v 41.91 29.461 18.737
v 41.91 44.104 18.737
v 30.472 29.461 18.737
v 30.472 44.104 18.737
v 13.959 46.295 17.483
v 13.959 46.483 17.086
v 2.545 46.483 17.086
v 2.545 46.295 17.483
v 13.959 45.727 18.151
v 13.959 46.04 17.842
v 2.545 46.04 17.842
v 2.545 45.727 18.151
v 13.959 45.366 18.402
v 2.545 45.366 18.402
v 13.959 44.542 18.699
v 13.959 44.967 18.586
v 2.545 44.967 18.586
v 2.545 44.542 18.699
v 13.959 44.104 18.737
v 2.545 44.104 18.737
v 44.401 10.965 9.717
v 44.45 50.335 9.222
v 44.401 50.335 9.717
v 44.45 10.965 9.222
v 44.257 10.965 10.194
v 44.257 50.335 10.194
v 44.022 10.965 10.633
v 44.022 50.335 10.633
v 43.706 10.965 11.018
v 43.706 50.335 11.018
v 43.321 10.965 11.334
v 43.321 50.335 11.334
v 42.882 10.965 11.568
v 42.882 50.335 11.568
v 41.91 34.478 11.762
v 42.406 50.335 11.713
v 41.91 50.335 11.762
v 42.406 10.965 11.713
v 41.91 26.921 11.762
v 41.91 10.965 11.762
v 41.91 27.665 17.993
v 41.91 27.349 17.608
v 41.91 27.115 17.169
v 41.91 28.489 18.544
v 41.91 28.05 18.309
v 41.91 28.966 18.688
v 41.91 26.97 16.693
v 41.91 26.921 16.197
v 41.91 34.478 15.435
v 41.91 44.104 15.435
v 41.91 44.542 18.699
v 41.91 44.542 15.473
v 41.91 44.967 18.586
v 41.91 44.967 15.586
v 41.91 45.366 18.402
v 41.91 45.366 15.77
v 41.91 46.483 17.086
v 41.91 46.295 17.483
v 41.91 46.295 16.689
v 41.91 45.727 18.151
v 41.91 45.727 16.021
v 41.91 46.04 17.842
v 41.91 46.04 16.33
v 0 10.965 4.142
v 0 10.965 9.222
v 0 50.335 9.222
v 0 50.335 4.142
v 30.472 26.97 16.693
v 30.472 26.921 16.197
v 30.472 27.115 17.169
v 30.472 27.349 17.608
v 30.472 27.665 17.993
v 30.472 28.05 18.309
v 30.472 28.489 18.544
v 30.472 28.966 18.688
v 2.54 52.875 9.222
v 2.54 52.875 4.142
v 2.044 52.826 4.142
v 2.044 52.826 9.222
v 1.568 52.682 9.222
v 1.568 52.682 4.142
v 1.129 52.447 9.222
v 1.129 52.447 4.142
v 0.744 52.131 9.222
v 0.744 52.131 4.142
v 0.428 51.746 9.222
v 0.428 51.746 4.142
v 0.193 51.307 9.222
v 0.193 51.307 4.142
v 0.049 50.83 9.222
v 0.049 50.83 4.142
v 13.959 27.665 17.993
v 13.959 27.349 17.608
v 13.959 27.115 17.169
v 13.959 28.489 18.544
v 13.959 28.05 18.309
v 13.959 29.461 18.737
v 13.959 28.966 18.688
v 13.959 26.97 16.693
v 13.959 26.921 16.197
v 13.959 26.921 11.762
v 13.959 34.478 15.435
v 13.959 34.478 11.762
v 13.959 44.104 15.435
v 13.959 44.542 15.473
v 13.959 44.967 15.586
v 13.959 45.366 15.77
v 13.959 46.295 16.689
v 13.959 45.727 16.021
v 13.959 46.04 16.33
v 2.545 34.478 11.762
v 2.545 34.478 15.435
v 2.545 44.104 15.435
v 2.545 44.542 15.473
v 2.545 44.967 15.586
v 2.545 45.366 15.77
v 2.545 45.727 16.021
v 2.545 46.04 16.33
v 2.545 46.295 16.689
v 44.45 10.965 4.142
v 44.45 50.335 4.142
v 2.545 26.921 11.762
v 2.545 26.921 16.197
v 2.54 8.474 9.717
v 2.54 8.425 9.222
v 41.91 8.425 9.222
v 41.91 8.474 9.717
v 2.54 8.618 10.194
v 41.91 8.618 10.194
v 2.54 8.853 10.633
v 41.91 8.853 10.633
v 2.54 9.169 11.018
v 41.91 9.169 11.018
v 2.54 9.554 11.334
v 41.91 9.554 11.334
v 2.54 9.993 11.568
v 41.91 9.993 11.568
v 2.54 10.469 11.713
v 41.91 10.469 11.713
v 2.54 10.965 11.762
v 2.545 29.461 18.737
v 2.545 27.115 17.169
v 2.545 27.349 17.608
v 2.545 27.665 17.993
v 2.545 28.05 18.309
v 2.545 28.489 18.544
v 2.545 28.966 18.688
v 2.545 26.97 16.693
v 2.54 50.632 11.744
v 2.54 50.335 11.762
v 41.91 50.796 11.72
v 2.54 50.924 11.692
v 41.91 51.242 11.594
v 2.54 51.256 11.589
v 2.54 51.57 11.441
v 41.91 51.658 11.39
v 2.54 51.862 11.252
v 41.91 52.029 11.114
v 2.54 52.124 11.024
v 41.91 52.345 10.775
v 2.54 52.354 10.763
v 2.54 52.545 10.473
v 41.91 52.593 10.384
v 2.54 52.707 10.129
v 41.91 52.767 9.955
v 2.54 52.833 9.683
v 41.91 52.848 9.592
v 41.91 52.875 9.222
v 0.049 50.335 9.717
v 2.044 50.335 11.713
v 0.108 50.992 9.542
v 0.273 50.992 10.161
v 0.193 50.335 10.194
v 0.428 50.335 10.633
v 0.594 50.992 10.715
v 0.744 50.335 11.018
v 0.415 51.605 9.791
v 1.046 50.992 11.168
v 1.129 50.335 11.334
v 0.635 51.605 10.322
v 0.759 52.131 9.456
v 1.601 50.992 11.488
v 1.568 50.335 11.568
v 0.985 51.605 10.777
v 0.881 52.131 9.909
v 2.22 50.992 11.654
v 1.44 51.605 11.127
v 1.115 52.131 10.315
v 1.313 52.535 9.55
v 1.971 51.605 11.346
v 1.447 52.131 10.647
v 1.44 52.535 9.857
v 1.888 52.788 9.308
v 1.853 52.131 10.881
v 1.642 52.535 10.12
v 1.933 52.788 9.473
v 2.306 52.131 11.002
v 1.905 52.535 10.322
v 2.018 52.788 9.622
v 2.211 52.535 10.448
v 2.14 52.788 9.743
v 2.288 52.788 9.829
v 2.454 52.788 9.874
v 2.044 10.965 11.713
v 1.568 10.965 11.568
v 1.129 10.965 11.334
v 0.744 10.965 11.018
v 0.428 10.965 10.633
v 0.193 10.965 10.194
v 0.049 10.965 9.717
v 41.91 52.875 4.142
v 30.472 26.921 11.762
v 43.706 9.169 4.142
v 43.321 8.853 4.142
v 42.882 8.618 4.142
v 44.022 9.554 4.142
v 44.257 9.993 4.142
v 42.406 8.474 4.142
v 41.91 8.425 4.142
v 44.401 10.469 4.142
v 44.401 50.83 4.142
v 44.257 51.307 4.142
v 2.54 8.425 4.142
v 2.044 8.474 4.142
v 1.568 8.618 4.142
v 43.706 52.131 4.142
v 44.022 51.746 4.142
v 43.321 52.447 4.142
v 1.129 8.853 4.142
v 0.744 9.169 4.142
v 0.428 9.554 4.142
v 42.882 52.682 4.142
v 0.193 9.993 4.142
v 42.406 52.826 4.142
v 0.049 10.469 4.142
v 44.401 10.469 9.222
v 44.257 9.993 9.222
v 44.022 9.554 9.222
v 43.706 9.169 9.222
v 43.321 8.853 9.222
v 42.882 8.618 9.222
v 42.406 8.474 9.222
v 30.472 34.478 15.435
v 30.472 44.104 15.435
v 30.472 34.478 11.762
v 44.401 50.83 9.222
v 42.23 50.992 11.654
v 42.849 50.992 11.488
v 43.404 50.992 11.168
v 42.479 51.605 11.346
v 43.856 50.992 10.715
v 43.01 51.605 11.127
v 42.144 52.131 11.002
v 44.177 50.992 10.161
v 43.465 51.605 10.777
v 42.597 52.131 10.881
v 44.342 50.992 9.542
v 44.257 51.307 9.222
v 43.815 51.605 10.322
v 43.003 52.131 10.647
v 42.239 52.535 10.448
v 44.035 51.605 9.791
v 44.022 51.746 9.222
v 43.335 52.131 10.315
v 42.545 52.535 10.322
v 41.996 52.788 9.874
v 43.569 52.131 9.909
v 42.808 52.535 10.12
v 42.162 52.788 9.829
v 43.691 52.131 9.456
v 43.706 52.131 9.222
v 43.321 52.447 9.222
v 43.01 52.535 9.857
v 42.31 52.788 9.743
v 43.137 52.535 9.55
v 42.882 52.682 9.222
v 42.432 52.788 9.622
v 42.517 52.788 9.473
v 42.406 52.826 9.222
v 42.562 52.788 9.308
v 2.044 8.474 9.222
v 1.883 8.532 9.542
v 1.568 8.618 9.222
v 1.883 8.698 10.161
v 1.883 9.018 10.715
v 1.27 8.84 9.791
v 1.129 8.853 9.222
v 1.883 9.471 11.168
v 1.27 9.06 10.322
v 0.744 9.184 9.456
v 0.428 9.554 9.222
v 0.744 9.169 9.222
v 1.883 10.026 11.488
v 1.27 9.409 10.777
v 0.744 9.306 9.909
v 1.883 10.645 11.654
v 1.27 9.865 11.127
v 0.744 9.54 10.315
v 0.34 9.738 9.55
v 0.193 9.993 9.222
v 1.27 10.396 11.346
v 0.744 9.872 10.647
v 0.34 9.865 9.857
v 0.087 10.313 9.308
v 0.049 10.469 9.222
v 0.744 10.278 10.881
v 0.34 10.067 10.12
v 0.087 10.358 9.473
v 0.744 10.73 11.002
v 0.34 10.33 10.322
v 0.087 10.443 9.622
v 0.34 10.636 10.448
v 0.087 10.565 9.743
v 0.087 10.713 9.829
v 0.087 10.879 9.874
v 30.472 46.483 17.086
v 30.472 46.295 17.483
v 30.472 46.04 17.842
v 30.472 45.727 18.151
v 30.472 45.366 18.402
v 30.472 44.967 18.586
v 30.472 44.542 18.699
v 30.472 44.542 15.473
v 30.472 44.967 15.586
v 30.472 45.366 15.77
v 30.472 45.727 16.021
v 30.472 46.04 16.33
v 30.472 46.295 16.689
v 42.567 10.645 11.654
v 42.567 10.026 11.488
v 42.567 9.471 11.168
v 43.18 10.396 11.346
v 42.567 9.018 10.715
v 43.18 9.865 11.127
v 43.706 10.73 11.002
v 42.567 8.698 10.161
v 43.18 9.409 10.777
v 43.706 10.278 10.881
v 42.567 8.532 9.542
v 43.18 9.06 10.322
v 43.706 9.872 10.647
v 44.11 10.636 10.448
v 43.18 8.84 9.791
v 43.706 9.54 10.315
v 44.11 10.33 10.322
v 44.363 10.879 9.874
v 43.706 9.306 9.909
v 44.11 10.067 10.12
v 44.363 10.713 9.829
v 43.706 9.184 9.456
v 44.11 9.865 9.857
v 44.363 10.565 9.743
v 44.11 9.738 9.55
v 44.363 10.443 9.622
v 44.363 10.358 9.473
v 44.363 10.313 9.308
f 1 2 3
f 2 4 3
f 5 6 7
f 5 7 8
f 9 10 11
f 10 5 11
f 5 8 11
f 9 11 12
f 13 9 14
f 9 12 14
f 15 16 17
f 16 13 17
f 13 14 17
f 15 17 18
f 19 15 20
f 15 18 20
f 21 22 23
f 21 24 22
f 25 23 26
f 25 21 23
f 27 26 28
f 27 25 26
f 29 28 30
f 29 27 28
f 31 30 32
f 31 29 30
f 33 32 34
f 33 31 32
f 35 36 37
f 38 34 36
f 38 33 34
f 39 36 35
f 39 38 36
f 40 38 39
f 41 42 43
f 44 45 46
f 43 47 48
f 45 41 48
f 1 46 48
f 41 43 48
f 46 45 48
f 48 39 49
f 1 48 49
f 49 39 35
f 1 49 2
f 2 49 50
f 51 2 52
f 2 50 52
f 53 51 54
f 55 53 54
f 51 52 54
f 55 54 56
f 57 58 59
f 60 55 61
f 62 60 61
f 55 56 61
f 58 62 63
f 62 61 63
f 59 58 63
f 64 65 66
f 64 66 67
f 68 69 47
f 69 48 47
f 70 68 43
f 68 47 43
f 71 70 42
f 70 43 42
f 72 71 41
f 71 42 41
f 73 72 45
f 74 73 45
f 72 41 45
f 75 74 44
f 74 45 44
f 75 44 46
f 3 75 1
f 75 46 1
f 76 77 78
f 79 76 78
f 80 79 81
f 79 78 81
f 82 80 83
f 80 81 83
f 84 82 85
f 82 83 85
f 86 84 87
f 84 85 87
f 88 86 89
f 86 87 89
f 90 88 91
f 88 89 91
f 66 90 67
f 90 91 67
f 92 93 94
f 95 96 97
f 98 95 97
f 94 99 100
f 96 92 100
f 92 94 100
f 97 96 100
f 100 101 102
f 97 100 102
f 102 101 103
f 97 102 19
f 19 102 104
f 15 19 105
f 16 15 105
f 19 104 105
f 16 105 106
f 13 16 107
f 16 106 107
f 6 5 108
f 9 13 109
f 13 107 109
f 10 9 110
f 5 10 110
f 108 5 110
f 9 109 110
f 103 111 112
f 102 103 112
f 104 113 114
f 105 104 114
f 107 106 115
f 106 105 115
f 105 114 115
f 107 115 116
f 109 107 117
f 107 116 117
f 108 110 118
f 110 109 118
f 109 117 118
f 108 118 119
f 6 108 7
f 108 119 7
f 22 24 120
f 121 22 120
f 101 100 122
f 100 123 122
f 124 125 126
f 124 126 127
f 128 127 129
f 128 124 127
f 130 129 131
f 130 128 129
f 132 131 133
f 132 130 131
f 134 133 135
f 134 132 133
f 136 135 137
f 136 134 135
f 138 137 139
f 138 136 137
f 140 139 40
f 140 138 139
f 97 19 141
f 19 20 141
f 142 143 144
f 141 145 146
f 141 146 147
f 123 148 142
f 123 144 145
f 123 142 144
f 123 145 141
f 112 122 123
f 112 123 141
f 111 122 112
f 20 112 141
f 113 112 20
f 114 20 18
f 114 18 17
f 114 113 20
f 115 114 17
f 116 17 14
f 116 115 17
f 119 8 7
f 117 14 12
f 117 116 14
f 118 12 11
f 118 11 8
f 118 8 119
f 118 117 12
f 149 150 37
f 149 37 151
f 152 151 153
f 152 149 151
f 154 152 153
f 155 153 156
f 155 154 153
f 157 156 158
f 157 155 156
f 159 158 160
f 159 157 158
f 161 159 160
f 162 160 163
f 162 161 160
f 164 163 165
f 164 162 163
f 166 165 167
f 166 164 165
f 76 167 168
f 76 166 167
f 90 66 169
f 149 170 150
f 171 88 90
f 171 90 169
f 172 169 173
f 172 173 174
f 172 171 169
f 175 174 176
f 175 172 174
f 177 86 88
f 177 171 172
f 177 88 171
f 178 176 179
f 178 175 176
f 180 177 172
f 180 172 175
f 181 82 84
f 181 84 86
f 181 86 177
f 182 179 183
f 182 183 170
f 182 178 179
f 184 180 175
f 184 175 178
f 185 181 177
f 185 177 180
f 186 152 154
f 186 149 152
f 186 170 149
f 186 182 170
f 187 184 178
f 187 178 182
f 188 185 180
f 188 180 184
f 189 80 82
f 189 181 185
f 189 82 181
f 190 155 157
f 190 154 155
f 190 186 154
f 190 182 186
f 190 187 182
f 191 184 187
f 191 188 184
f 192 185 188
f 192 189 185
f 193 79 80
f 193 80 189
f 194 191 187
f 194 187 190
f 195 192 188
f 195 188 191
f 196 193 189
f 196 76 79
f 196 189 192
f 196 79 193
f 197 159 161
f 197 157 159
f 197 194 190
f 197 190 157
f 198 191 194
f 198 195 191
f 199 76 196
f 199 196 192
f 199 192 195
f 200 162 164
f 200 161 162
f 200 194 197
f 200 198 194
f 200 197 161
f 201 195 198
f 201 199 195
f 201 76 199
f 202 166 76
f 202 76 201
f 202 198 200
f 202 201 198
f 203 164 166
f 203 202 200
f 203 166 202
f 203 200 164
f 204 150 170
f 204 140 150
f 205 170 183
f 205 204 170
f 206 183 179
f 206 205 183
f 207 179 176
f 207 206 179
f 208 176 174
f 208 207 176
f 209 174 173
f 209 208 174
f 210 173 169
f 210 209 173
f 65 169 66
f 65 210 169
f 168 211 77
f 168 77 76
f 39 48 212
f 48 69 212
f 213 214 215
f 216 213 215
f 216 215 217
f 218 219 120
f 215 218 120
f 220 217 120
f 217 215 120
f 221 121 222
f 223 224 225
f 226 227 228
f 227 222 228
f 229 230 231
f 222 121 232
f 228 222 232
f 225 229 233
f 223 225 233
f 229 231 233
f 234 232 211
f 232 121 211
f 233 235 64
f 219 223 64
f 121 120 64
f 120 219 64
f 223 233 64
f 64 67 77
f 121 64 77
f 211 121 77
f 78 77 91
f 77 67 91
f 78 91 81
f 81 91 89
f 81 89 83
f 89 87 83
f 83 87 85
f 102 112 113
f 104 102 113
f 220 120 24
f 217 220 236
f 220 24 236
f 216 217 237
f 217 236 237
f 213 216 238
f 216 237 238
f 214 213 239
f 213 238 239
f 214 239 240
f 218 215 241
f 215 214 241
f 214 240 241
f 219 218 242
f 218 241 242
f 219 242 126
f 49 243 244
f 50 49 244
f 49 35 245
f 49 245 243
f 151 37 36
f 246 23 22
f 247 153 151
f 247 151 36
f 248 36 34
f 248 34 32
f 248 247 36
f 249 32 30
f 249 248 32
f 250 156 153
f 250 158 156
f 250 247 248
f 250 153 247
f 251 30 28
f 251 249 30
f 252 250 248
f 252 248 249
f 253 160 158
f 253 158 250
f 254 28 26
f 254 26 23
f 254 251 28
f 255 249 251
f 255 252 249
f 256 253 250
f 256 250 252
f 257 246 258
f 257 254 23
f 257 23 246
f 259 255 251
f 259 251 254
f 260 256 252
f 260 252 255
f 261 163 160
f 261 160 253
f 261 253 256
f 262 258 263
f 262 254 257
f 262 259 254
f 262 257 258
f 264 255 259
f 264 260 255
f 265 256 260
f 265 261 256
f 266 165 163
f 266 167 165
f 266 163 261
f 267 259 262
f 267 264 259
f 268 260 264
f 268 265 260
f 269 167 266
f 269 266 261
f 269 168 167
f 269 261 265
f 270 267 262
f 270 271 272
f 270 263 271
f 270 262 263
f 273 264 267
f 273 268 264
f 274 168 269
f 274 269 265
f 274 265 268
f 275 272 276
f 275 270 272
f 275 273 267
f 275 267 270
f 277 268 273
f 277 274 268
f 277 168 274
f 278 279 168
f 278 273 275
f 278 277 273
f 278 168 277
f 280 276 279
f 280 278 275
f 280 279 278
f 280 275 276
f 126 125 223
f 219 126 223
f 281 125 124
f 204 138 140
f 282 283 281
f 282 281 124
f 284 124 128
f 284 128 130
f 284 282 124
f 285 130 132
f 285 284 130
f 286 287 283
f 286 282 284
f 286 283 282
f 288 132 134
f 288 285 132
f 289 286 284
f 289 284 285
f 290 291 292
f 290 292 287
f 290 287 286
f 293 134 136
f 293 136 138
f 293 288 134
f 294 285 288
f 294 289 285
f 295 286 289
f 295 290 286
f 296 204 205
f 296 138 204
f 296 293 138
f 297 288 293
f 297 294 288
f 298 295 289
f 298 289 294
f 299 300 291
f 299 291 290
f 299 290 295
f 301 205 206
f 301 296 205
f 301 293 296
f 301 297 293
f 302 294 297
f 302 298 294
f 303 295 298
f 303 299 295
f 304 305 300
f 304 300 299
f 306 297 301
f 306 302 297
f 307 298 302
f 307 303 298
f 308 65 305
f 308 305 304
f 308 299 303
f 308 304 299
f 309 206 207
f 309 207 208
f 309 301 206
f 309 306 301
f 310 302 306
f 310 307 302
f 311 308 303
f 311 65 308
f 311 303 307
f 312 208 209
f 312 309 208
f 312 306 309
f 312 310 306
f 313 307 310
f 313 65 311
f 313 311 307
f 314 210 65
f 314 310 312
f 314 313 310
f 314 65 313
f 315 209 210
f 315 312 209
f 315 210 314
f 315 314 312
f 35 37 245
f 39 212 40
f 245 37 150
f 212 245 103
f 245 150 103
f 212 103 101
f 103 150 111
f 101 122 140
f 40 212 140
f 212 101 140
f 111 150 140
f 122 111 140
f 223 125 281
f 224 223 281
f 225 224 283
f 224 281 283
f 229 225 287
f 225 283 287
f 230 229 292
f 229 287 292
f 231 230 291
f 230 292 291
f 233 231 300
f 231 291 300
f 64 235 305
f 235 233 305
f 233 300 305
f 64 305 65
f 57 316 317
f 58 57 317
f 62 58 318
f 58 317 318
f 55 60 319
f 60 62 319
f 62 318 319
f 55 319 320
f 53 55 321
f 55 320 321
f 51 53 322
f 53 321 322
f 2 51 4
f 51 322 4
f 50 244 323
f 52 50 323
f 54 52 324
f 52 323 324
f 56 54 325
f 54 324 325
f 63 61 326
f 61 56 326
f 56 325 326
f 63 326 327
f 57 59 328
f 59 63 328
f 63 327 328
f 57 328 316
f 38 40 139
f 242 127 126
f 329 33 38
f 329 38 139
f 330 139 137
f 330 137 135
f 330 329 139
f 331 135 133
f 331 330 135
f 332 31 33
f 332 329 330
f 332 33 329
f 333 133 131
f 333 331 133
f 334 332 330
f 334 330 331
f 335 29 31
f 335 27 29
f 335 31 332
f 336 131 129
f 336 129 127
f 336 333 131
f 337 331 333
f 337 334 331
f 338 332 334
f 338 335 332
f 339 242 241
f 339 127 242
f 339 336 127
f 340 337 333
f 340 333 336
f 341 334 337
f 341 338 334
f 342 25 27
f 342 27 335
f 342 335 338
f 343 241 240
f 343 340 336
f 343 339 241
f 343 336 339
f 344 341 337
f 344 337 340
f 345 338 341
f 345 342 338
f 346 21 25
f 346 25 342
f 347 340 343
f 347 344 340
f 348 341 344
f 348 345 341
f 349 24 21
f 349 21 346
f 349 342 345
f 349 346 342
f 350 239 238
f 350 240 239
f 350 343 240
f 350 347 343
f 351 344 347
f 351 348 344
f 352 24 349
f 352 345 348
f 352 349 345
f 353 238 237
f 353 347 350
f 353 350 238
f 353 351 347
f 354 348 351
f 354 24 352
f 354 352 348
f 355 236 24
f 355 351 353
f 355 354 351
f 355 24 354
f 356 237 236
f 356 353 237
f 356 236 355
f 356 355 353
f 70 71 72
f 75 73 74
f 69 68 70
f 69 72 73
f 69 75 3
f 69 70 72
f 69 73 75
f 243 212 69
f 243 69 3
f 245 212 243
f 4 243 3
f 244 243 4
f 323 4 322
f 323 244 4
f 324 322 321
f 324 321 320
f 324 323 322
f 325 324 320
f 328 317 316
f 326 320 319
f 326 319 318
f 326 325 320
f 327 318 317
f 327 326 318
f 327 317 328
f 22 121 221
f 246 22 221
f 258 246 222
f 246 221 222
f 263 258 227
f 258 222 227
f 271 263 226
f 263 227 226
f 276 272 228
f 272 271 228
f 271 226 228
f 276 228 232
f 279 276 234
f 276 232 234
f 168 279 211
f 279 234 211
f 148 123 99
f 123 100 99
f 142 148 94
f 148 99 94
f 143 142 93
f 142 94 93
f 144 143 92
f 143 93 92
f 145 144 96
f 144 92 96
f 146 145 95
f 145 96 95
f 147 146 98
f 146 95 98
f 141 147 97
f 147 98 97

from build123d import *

# Parameters (mm, degrees)
BOSS_EXTRUDE1_DEPTH     = 44.45
CUT_EXTRUDE1_DEPTH      = 6.35
CUT_EXTRUDE1_DEPTH_BACK = 3.81
SKETCH2_W               = 2.54
SKETCH2_H               = 19.817543538
CUT_EXTRUDE2_DEPTH      = 5.08
CUT_EXTRUDE2_DEPTH_BACK = 3.81
SKETCH4_W               = 2.544966755
SKETCH4_H               = 19.817543538
CUT_EXTRUDE3_DEPTH      = 5.08
CUT_EXTRUDE3_DEPTH_BACK = 3.81
SKETCH8_W               = 16.513276495
SKETCH8_H               = 19.817543538
FILLET3_DEPTH           = 44.45
FILLET3_START           = 7
FILLET3_2_DEPTH         = 47
FILLET4_R               = 2.54
FILLET5_R               = 2.54
FILLET6_R               = 2.54


with BuildPart() as part:
    # Sketch1 → Boss-Extrude1 (new body)
    with BuildSketch(Plane(origin=(0, 0, 0), x_dir=(0, 0, -1), z_dir=(1, 0, 0))):
        Polygon((-4.141724441, 52.87490044), (-11.761724441, 52.87490044), (-11.761724441, 34.478280211), (-15.434687804, 34.478280211), (-15.434687804, 46.643996602), (-18.737279906, 46.643996602), (-18.737279906, 26.921380181), (-11.761724441, 26.921380181), (-11.761724441, 8.42490044), (-4.141724441, 8.42490044), align=None)
    extrude(amount=BOSS_EXTRUDE1_DEPTH)

    # Sketch2 → Cut-Extrude1 (cut, two sides: drawn at the far end of the back side and taken through both)
    with BuildSketch(Plane.XY.offset(15.571724441).offset(-CUT_EXTRUDE1_DEPTH_BACK)):
        with Locations((43.18, 36.735224833)):
            Rectangle(SKETCH2_W, SKETCH2_H)
    extrude(amount=CUT_EXTRUDE1_DEPTH + CUT_EXTRUDE1_DEPTH_BACK, mode=Mode.SUBTRACT)

    # Sketch4 → Cut-Extrude2 (cut, two sides: drawn at the far end of the back side and taken through both)
    with BuildSketch(Plane.XY.offset(15.571724441).offset(-CUT_EXTRUDE2_DEPTH_BACK)):
        with Locations((1.272483378, 36.735224833)):
            Rectangle(SKETCH4_W, SKETCH4_H)
    extrude(amount=CUT_EXTRUDE2_DEPTH + CUT_EXTRUDE2_DEPTH_BACK, mode=Mode.SUBTRACT)

    # Sketch8 → Cut-Extrude3 (cut, two sides: drawn at the far end of the back side and taken through both)
    with BuildSketch(Plane.XY.offset(15.571724441).offset(-CUT_EXTRUDE3_DEPTH_BACK)):
        with Locations((22.215391178, 36.735224833)):
            Rectangle(SKETCH8_W, SKETCH8_H)
    extrude(amount=CUT_EXTRUDE3_DEPTH + CUT_EXTRUDE3_DEPTH_BACK, mode=Mode.SUBTRACT)

    # Fillet3: read off the stored shape, not the designer's step
    # Fillet3 outline → Fillet3 (cut)
    with BuildSketch(Plane.YZ):
        with BuildLine():
            ThreePointArc((8.42490044, 9.221724441), (9.168849215, 11.017775666), (10.96490044, 11.761724441))
            Line((10.96490044, 11.761724441), (8.42490044, 11.761724441))
            Line((8.42490044, 11.761724441), (8.42490044, 9.221724441))
        make_face()
        with BuildLine():
            ThreePointArc((50.33490044, 11.761724441), (52.130951664, 11.017775665), (52.87490044, 9.221724441))
            Line((52.87490044, 9.221724441), (52.87490044, 11.761724441))
            Line((52.87490044, 11.761724441), (50.33490044, 11.761724441))
        make_face()
    extrude(amount=FILLET3_DEPTH, mode=Mode.SUBTRACT)

    # Fillet3 2 outline → Fillet3 2 (cut)
    with BuildSketch(Plane(origin=(0, 0, 0), x_dir=(1, 0, 0), z_dir=(0, 1, 0)).offset(FILLET3_START)):
        with BuildLine():
            Line((0, -11.761724441), (2.54, -11.761724441))
            ThreePointArc((2.54, -11.761724441), (0.743948776, -11.017775665), (0, -9.221724441))
            Line((0, -9.221724441), (0, -11.761724441))
        make_face()
        with BuildLine():
            ThreePointArc((44.45, -9.221724441), (43.706051224, -11.017775665), (41.91, -11.761724441))
            Line((41.91, -11.761724441), (44.45, -11.761724441))
            Line((44.45, -11.761724441), (44.45, -9.221724441))
        make_face()
    extrude(amount=FILLET3_2_DEPTH, mode=Mode.SUBTRACT)

    # Fillet4
    # the kernel refuses this fillet: 2.54 mm, written as the material it takes off along each edge
    with BuildSketch(Plane(origin=(41.91, 50.33490044, 9.221724441), x_dir=(1, 0, 0), z_dir=(0, 1, 0))) as fillet4_piece_1_section:
        Polygon((0, 0), (FILLET4_R, 0), (FILLET4_R, -FILLET4_R), (0, -FILLET4_R), align=None)
    fillet4_piece_1 = extrude(amount=FILLET4_R, mode=Mode.PRIVATE)
    fillet4_piece_1 = fillet4_piece_1 - Plane(origin=(41.91, 50.33490044, 9.221724441), x_dir=(-0.7071067811865475, 0, -0.7071067811865475), z_dir=(0, 1, 0)) * Sphere(FILLET4_R, mode=Mode.PRIVATE)
    add(fillet4_piece_1, mode=Mode.SUBTRACT)
    with BuildSketch(Plane(origin=(2.54, 50.33490044, 9.221724441), x_dir=(-1, 0, 0), z_dir=(0, 1, 0))) as fillet4_piece_2_section:
        Polygon((0, 0), (FILLET4_R, 0), (FILLET4_R, FILLET4_R), (0, FILLET4_R), align=None)
    fillet4_piece_2 = extrude(amount=FILLET4_R, mode=Mode.PRIVATE)
    fillet4_piece_2 = fillet4_piece_2 - Plane(origin=(2.54, 50.33490044, 9.221724441), x_dir=(0.7071067811865475, 0, -0.7071067811865475), z_dir=(0, 1, 0)) * Sphere(FILLET4_R, mode=Mode.PRIVATE)
    add(fillet4_piece_2, mode=Mode.SUBTRACT)
    with BuildSketch(Plane(origin=(41.91, 10.96490044, 9.221724441), x_dir=(0, -1, 0), z_dir=(1, 0, 0))) as fillet4_piece_3_section:
        Polygon((0, 0), (FILLET4_R, 0), (FILLET4_R, -FILLET4_R), (0, -FILLET4_R), align=None)
    fillet4_piece_3 = extrude(amount=FILLET4_R, mode=Mode.PRIVATE)
    fillet4_piece_3 = fillet4_piece_3 - Plane(origin=(41.91, 10.96490044, 9.221724441), x_dir=(0, 0.7071067811865476, -0.7071067811865475), z_dir=(1, 0, 0)) * Sphere(FILLET4_R, mode=Mode.PRIVATE)
    add(fillet4_piece_3, mode=Mode.SUBTRACT)
    with BuildSketch(Plane(origin=(2.54, 10.96490044, 9.221724441), x_dir=(0, -1, 0), z_dir=(-1, 0, 0))) as fillet4_piece_4_section:
        Polygon((0, 0), (FILLET4_R, 0), (FILLET4_R, FILLET4_R), (0, FILLET4_R), align=None)
    fillet4_piece_4 = extrude(amount=FILLET4_R, mode=Mode.PRIVATE)
    fillet4_piece_4 = fillet4_piece_4 - Plane(origin=(2.54, 10.96490044, 9.221724441), x_dir=(0, 0.7071067811865476, -0.7071067811865475), z_dir=(-1, 0, 0)) * Sphere(FILLET4_R, mode=Mode.PRIVATE)
    add(fillet4_piece_4, mode=Mode.SUBTRACT)
    with BuildSketch(Plane(origin=(0, 52.87490044, -2.208275559), x_dir=(1, 0, 0), z_dir=(0, 0, 1)), Plane(origin=(44.45, 8.42490044, 9.221724441), x_dir=(0, 1, 0), z_dir=(0, 0, -1))) as fillet4_piece_5:
        with BuildLine():
            CenterArc((FILLET4_R, -FILLET4_R), FILLET4_R, 90, 90)
            Line((0, -FILLET4_R), (0, 0))
            Line((0, 0), (FILLET4_R, 0))
        make_face()
    extrude(amount=11.43, mode=Mode.SUBTRACT)
    with BuildSketch(Plane(origin=(44.45, 52.87490044, -2.208275559), x_dir=(-1, 0, 0), z_dir=(0, 0, 1)), Plane(origin=(0, 8.42490044, 9.221724441), x_dir=(0, 1, 0), z_dir=(0, 0, -1))) as fillet4_piece_6:
        with BuildLine():
            CenterArc((FILLET4_R, FILLET4_R), FILLET4_R, 180, 90)
            Line((0, FILLET4_R), (0, 0))
            Line((0, 0), (FILLET4_R, 0))
        make_face()
    extrude(amount=11.43, mode=Mode.SUBTRACT)

    # Fillet5
    # the kernel refuses this fillet: 2.54 mm, written as the material it takes off along each edge
    with BuildSketch(Plane(origin=(24.122029425, 46.643996602, 18.737279906), x_dir=(0, -1, 0), z_dir=(1, 0, 0)), Plane(origin=(24.122029425, 46.643996602, 15.434687804), x_dir=(0, 0, 1), z_dir=(1, 0, 0))) as fillet5_piece_1:
        with BuildLine():
            CenterArc((FILLET5_R, FILLET5_R), FILLET5_R, 180, 90)
            Line((0, FILLET5_R), (0, 0))
            Line((0, 0), (FILLET5_R, 0))
        make_face()
    extrude(amount=24.137970575, mode=Mode.SUBTRACT)
    with BuildSketch(Plane(origin=(-3.805033245, 46.643996602, 18.737279906), x_dir=(0, 0, -1), z_dir=(1, 0, 0)), Plane(origin=(-3.805033245, 46.643996602, 15.434687804), x_dir=(0, -1, 0), z_dir=(1, 0, 0))) as fillet5_piece_2:
        with BuildLine():
            CenterArc((FILLET5_R, -FILLET5_R), FILLET5_R, 90, 90)
            Line((0, -FILLET5_R), (0, 0))
            Line((0, 0), (FILLET5_R, 0))
        make_face()
    extrude(amount=24.113786175, mode=Mode.SUBTRACT)

    # Fillet6
    fillet6_edges = [part.edges().sort_by_distance(p)[0] for p in [
        (36.191014713, 26.921380181, 18.737279906),
        (8.251859842, 26.921380181, 18.737279906),
    ]]
    fillet(fillet6_edges, radius=FILLET6_R)


solid = part.part
